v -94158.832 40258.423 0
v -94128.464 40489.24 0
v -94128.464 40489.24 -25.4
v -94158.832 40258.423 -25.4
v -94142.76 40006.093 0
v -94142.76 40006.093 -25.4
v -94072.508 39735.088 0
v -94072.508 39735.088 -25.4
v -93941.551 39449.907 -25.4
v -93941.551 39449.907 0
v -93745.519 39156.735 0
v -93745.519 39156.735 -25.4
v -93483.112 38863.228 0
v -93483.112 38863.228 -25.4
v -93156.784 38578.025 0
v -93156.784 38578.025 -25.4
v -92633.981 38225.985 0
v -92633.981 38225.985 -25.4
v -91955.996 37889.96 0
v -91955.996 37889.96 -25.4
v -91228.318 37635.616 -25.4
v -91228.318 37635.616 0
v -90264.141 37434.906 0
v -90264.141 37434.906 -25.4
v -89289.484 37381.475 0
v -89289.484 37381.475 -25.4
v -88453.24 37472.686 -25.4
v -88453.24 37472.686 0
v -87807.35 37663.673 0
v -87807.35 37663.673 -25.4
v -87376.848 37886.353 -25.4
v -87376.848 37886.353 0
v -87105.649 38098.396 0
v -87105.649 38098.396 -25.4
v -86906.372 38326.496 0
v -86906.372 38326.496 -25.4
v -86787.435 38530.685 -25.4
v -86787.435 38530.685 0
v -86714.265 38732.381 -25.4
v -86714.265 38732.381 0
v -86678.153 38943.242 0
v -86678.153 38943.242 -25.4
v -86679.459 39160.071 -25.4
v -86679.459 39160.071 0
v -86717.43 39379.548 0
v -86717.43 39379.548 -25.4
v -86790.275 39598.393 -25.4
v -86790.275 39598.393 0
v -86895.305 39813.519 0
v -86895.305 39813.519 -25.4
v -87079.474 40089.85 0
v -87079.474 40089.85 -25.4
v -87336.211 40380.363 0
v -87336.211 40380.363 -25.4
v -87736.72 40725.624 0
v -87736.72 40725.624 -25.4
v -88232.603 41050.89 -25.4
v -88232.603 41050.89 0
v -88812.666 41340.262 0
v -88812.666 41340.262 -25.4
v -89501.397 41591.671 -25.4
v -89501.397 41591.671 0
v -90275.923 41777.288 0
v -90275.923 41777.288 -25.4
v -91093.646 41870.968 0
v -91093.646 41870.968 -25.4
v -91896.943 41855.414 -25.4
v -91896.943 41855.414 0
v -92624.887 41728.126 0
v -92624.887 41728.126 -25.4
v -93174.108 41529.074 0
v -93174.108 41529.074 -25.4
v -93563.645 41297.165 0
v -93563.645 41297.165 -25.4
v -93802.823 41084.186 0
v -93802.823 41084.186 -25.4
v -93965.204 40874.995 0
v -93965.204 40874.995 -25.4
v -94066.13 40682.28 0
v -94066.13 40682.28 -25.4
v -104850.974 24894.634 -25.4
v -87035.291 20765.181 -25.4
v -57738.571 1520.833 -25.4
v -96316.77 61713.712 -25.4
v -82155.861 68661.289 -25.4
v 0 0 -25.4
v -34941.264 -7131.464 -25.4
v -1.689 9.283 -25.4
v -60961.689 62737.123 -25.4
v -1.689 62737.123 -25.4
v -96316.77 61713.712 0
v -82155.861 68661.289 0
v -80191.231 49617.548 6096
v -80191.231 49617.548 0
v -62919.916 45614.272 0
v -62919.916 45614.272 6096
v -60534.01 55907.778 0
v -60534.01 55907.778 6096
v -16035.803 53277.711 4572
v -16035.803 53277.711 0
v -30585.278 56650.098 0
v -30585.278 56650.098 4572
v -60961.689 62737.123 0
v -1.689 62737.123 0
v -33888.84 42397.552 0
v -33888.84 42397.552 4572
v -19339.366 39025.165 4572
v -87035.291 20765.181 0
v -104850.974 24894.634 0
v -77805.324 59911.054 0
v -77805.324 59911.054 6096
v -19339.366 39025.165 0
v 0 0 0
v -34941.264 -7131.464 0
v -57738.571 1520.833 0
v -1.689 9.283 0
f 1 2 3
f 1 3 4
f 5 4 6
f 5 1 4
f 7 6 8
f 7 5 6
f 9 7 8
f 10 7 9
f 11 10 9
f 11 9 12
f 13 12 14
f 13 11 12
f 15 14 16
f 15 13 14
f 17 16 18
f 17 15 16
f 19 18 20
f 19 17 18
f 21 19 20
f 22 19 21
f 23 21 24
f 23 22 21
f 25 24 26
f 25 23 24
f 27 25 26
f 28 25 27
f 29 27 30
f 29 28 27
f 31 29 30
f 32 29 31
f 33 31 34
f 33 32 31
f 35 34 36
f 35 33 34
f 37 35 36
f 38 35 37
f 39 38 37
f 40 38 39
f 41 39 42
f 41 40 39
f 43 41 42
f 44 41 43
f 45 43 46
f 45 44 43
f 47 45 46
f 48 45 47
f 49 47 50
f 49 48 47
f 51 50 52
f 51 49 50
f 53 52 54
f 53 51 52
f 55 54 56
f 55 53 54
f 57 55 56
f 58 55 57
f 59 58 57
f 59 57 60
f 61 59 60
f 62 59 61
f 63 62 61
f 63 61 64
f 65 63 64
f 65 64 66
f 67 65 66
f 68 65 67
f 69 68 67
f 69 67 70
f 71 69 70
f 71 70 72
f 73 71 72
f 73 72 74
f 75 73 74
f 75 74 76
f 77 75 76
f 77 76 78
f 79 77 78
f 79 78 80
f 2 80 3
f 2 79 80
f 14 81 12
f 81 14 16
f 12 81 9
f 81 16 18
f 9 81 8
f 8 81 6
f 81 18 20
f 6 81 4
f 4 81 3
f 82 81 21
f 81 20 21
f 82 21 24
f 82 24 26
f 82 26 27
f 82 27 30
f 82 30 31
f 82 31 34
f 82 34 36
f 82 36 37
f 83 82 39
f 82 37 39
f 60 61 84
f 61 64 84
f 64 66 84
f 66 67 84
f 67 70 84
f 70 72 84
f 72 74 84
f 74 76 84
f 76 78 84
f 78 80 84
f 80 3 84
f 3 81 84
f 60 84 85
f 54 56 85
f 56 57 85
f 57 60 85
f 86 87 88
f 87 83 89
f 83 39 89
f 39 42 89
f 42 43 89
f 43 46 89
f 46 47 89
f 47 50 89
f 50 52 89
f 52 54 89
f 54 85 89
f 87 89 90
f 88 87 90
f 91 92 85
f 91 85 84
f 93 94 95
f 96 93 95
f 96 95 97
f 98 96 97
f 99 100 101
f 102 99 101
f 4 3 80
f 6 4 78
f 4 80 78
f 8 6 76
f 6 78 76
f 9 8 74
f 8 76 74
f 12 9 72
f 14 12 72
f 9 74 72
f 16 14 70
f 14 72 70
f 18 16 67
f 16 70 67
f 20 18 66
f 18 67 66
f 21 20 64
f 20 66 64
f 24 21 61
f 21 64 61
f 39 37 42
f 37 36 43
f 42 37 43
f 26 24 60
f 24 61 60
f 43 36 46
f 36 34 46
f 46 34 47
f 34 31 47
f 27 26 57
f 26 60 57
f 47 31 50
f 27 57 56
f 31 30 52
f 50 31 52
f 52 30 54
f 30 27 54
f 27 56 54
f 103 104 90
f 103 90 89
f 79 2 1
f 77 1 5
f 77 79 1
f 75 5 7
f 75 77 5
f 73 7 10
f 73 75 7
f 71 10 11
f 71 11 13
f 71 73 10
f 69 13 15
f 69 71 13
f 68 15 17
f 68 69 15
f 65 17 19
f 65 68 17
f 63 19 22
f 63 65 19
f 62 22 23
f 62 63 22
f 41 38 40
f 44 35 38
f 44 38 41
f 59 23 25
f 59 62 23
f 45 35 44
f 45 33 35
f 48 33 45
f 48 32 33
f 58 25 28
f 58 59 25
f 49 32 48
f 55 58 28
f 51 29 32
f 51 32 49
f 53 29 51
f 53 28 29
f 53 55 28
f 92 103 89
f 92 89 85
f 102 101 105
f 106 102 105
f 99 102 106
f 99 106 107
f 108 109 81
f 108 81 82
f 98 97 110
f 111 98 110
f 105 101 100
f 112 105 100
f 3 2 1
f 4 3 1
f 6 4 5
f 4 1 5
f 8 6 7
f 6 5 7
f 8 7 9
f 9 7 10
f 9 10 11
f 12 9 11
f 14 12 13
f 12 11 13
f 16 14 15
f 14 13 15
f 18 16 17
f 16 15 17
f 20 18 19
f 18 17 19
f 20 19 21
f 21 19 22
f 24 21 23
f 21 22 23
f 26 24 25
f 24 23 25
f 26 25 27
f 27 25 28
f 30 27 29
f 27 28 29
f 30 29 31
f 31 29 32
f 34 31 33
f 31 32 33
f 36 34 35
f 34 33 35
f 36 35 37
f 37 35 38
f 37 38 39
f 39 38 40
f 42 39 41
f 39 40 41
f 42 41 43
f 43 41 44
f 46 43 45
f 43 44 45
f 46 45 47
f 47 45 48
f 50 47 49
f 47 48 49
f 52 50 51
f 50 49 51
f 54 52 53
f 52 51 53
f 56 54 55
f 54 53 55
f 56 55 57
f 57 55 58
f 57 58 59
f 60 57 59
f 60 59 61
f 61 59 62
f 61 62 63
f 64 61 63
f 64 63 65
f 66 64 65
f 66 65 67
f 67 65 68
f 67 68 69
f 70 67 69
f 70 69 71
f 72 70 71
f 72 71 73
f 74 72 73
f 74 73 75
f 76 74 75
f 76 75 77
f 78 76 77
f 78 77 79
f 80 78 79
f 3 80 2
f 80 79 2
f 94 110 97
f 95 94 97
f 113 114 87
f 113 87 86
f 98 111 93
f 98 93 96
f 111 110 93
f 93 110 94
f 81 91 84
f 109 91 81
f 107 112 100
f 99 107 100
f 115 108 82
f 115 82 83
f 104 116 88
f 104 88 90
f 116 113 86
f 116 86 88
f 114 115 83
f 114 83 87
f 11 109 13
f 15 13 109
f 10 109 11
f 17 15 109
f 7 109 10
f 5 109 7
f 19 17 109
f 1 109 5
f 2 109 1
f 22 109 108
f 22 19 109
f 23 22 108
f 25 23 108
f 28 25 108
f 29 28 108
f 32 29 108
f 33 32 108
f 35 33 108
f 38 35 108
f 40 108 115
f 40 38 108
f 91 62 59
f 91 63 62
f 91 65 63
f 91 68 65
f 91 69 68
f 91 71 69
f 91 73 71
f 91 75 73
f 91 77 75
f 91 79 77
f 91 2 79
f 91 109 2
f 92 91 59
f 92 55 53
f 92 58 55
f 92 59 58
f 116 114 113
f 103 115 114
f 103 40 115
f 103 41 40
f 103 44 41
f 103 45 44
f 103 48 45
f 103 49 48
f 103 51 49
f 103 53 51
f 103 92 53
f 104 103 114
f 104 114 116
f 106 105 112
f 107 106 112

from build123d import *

# Parameters (mm, degrees)
F1_DEPTH = 25.4
F2_DEPTH = 6096
F3_DEPTH = 4572
F4_DEPTH = 25.4
F5_DEPTH = 25.4


# Not quite as in the source:
# - a feature names something its author has since deleted; it is built from what else it names


with BuildPart() as f1:
    # F0 (on Top) → F1 (new body)
    with BuildSketch(Plane.XY):
        Polygon((-33112.4640655049, -3647.3720976521), (-1.6886040407, 3110.491777778), (-1.6886040407, 62737.1229546988), (-60961.6886040408, 62737.1229546987), (-82155.8610464841, 68661.2885088993), (-96316.7696711288, 61713.7123499455), (-104438.0283558496, 26676.2026448331), (-86304.1977238219, 22473.00640182), (-56902.1438828347, 3159.4669638971), (-36770.0640655049, -4481.2923027159), (-36770.0640655049, -599.3720976521), (-33112.4640655049, -599.3720976521), align=None)
        with BuildLine():
            add(Edge.make_bspline(
                [(-94128.4642083729, 40489.2396473104), (-94962.9136036562, 36889.1783857883), (-88978.2879994819, 37398.7547763924), (-82993.6623953076, 37908.3311669965), (-88143.8386041986, 40998.8160379144), (-93294.0148130897, 44089.3009088324), (-94128.4642083729, 40489.2396473104)],
                knots=[0, 0, 0, 2.0943951024, 2.0943951024, 4.1887902048, 4.1887902048, 6.2831853072, 6.2831853072, 6.2831853072], degree=2, weights=[1, 0.5, 1, 0.5, 1, 0.5, 1]))
        make_face(mode=Mode.SUBTRACT)
        Polygon((-80191.2308576593, 49617.5479871827), (-77805.3243514137, 59911.0536632609), (-60534.0095391478, 55907.7778426853), (-62919.9160453934, 45614.272166607), align=None, mode=Mode.SUBTRACT)
        Polygon((-33888.8404387287, 42397.5516428327), (-30585.277583927, 56650.0979635563), (-16035.8032148549, 53277.7108826129), (-19339.3660696566, 39025.1645618892), align=None, mode=Mode.SUBTRACT)
        Polygon((-34941.264065505, -7131.4640898385), (0, 0), (-1.6886040407, 9.2829546987), (-1.6886040407, 3110.491777778), (-33112.4640655049, -3647.3720976521), (-33112.4640655049, -599.3720976521), (-36770.0640655049, -599.3720976521), (-36770.0640655049, -4481.2923027159), (-56902.1438828347, 3159.4669638971), (-86304.1977238219, 22473.00640182), (-104438.0283558496, 26676.2026448331), (-104850.9737126999, 24894.6343547425), (-87035.2908096331, 20765.1807955688), (-57738.5711688761, 1520.832994438), align=None)
        Polygon((-16035.8032148549, 53277.7108826129), (-30585.277583927, 56650.0979635563), (-33888.8404387287, 42397.5516428327), (-19339.3660696566, 39025.1645618892), align=None)
        Polygon((-60534.0095391478, 55907.7778426853), (-77805.3243514137, 59911.0536632609), (-80191.2308576593, 49617.5479871827), (-62919.9160453935, 45614.272166607), align=None)
    extrude(amount=-F1_DEPTH)

    # F0 (on Top) → F4 (cut, through all)
    with BuildSketch(Plane.XY):
        with BuildLine():
            add(Edge.make_bspline(
                [(-94128.4642083729, 40489.2396473104), (-94962.9136036562, 36889.1783857883), (-88978.2879994819, 37398.7547763924), (-82993.6623953076, 37908.3311669965), (-88143.8386041986, 40998.8160379144), (-93294.0148130897, 44089.3009088324), (-94128.4642083729, 40489.2396473104)],
                knots=[0, 0, 0, 2.0943951024, 2.0943951024, 4.1887902048, 4.1887902048, 6.2831853072, 6.2831853072, 6.2831853072], degree=2, weights=[1, 0.5, 1, 0.5, 1, 0.5, 1]))
        make_face()
    extrude(amount=-F4_DEPTH, mode=Mode.SUBTRACT)


with BuildPart() as f2:
    # F0 (on Top) → F2 (new body)
    with BuildSketch(Plane.XY):
        Polygon((-60534.0095391478, 55907.7778426853), (-77805.3243514137, 59911.0536632609), (-80191.2308576593, 49617.5479871827), (-62919.9160453935, 45614.272166607), align=None)
    extrude(amount=F2_DEPTH)


with BuildPart() as f3:
    # F0 (on Top) → F3 (new body)
    with BuildSketch(Plane.XY):
        Polygon((-16035.8032148549, 53277.7108826129), (-30585.277583927, 56650.0979635563), (-33888.8404387287, 42397.5516428327), (-19339.3660696566, 39025.1645618892), align=None)
    extrude(amount=F3_DEPTH)


with BuildPart() as f5:
    # F0 (on Top) → F5 (new body, through all)
    with BuildSketch(Plane.XY):
        with BuildLine():
            add(Edge.make_bspline(
                [(-94128.4642083729, 40489.2396473104), (-94962.9136036562, 36889.1783857883), (-88978.2879994819, 37398.7547763924), (-82993.6623953076, 37908.3311669965), (-88143.8386041986, 40998.8160379144), (-93294.0148130897, 44089.3009088324), (-94128.4642083729, 40489.2396473104)],
                knots=[0, 0, 0, 2.0943951024, 2.0943951024, 4.1887902048, 4.1887902048, 6.2831853072, 6.2831853072, 6.2831853072], degree=2, weights=[1, 0.5, 1, 0.5, 1, 0.5, 1]))
        make_face()
    extrude(amount=-F5_DEPTH)


solid = Compound([f1.part, f2.part, f3.part, f5.part])
